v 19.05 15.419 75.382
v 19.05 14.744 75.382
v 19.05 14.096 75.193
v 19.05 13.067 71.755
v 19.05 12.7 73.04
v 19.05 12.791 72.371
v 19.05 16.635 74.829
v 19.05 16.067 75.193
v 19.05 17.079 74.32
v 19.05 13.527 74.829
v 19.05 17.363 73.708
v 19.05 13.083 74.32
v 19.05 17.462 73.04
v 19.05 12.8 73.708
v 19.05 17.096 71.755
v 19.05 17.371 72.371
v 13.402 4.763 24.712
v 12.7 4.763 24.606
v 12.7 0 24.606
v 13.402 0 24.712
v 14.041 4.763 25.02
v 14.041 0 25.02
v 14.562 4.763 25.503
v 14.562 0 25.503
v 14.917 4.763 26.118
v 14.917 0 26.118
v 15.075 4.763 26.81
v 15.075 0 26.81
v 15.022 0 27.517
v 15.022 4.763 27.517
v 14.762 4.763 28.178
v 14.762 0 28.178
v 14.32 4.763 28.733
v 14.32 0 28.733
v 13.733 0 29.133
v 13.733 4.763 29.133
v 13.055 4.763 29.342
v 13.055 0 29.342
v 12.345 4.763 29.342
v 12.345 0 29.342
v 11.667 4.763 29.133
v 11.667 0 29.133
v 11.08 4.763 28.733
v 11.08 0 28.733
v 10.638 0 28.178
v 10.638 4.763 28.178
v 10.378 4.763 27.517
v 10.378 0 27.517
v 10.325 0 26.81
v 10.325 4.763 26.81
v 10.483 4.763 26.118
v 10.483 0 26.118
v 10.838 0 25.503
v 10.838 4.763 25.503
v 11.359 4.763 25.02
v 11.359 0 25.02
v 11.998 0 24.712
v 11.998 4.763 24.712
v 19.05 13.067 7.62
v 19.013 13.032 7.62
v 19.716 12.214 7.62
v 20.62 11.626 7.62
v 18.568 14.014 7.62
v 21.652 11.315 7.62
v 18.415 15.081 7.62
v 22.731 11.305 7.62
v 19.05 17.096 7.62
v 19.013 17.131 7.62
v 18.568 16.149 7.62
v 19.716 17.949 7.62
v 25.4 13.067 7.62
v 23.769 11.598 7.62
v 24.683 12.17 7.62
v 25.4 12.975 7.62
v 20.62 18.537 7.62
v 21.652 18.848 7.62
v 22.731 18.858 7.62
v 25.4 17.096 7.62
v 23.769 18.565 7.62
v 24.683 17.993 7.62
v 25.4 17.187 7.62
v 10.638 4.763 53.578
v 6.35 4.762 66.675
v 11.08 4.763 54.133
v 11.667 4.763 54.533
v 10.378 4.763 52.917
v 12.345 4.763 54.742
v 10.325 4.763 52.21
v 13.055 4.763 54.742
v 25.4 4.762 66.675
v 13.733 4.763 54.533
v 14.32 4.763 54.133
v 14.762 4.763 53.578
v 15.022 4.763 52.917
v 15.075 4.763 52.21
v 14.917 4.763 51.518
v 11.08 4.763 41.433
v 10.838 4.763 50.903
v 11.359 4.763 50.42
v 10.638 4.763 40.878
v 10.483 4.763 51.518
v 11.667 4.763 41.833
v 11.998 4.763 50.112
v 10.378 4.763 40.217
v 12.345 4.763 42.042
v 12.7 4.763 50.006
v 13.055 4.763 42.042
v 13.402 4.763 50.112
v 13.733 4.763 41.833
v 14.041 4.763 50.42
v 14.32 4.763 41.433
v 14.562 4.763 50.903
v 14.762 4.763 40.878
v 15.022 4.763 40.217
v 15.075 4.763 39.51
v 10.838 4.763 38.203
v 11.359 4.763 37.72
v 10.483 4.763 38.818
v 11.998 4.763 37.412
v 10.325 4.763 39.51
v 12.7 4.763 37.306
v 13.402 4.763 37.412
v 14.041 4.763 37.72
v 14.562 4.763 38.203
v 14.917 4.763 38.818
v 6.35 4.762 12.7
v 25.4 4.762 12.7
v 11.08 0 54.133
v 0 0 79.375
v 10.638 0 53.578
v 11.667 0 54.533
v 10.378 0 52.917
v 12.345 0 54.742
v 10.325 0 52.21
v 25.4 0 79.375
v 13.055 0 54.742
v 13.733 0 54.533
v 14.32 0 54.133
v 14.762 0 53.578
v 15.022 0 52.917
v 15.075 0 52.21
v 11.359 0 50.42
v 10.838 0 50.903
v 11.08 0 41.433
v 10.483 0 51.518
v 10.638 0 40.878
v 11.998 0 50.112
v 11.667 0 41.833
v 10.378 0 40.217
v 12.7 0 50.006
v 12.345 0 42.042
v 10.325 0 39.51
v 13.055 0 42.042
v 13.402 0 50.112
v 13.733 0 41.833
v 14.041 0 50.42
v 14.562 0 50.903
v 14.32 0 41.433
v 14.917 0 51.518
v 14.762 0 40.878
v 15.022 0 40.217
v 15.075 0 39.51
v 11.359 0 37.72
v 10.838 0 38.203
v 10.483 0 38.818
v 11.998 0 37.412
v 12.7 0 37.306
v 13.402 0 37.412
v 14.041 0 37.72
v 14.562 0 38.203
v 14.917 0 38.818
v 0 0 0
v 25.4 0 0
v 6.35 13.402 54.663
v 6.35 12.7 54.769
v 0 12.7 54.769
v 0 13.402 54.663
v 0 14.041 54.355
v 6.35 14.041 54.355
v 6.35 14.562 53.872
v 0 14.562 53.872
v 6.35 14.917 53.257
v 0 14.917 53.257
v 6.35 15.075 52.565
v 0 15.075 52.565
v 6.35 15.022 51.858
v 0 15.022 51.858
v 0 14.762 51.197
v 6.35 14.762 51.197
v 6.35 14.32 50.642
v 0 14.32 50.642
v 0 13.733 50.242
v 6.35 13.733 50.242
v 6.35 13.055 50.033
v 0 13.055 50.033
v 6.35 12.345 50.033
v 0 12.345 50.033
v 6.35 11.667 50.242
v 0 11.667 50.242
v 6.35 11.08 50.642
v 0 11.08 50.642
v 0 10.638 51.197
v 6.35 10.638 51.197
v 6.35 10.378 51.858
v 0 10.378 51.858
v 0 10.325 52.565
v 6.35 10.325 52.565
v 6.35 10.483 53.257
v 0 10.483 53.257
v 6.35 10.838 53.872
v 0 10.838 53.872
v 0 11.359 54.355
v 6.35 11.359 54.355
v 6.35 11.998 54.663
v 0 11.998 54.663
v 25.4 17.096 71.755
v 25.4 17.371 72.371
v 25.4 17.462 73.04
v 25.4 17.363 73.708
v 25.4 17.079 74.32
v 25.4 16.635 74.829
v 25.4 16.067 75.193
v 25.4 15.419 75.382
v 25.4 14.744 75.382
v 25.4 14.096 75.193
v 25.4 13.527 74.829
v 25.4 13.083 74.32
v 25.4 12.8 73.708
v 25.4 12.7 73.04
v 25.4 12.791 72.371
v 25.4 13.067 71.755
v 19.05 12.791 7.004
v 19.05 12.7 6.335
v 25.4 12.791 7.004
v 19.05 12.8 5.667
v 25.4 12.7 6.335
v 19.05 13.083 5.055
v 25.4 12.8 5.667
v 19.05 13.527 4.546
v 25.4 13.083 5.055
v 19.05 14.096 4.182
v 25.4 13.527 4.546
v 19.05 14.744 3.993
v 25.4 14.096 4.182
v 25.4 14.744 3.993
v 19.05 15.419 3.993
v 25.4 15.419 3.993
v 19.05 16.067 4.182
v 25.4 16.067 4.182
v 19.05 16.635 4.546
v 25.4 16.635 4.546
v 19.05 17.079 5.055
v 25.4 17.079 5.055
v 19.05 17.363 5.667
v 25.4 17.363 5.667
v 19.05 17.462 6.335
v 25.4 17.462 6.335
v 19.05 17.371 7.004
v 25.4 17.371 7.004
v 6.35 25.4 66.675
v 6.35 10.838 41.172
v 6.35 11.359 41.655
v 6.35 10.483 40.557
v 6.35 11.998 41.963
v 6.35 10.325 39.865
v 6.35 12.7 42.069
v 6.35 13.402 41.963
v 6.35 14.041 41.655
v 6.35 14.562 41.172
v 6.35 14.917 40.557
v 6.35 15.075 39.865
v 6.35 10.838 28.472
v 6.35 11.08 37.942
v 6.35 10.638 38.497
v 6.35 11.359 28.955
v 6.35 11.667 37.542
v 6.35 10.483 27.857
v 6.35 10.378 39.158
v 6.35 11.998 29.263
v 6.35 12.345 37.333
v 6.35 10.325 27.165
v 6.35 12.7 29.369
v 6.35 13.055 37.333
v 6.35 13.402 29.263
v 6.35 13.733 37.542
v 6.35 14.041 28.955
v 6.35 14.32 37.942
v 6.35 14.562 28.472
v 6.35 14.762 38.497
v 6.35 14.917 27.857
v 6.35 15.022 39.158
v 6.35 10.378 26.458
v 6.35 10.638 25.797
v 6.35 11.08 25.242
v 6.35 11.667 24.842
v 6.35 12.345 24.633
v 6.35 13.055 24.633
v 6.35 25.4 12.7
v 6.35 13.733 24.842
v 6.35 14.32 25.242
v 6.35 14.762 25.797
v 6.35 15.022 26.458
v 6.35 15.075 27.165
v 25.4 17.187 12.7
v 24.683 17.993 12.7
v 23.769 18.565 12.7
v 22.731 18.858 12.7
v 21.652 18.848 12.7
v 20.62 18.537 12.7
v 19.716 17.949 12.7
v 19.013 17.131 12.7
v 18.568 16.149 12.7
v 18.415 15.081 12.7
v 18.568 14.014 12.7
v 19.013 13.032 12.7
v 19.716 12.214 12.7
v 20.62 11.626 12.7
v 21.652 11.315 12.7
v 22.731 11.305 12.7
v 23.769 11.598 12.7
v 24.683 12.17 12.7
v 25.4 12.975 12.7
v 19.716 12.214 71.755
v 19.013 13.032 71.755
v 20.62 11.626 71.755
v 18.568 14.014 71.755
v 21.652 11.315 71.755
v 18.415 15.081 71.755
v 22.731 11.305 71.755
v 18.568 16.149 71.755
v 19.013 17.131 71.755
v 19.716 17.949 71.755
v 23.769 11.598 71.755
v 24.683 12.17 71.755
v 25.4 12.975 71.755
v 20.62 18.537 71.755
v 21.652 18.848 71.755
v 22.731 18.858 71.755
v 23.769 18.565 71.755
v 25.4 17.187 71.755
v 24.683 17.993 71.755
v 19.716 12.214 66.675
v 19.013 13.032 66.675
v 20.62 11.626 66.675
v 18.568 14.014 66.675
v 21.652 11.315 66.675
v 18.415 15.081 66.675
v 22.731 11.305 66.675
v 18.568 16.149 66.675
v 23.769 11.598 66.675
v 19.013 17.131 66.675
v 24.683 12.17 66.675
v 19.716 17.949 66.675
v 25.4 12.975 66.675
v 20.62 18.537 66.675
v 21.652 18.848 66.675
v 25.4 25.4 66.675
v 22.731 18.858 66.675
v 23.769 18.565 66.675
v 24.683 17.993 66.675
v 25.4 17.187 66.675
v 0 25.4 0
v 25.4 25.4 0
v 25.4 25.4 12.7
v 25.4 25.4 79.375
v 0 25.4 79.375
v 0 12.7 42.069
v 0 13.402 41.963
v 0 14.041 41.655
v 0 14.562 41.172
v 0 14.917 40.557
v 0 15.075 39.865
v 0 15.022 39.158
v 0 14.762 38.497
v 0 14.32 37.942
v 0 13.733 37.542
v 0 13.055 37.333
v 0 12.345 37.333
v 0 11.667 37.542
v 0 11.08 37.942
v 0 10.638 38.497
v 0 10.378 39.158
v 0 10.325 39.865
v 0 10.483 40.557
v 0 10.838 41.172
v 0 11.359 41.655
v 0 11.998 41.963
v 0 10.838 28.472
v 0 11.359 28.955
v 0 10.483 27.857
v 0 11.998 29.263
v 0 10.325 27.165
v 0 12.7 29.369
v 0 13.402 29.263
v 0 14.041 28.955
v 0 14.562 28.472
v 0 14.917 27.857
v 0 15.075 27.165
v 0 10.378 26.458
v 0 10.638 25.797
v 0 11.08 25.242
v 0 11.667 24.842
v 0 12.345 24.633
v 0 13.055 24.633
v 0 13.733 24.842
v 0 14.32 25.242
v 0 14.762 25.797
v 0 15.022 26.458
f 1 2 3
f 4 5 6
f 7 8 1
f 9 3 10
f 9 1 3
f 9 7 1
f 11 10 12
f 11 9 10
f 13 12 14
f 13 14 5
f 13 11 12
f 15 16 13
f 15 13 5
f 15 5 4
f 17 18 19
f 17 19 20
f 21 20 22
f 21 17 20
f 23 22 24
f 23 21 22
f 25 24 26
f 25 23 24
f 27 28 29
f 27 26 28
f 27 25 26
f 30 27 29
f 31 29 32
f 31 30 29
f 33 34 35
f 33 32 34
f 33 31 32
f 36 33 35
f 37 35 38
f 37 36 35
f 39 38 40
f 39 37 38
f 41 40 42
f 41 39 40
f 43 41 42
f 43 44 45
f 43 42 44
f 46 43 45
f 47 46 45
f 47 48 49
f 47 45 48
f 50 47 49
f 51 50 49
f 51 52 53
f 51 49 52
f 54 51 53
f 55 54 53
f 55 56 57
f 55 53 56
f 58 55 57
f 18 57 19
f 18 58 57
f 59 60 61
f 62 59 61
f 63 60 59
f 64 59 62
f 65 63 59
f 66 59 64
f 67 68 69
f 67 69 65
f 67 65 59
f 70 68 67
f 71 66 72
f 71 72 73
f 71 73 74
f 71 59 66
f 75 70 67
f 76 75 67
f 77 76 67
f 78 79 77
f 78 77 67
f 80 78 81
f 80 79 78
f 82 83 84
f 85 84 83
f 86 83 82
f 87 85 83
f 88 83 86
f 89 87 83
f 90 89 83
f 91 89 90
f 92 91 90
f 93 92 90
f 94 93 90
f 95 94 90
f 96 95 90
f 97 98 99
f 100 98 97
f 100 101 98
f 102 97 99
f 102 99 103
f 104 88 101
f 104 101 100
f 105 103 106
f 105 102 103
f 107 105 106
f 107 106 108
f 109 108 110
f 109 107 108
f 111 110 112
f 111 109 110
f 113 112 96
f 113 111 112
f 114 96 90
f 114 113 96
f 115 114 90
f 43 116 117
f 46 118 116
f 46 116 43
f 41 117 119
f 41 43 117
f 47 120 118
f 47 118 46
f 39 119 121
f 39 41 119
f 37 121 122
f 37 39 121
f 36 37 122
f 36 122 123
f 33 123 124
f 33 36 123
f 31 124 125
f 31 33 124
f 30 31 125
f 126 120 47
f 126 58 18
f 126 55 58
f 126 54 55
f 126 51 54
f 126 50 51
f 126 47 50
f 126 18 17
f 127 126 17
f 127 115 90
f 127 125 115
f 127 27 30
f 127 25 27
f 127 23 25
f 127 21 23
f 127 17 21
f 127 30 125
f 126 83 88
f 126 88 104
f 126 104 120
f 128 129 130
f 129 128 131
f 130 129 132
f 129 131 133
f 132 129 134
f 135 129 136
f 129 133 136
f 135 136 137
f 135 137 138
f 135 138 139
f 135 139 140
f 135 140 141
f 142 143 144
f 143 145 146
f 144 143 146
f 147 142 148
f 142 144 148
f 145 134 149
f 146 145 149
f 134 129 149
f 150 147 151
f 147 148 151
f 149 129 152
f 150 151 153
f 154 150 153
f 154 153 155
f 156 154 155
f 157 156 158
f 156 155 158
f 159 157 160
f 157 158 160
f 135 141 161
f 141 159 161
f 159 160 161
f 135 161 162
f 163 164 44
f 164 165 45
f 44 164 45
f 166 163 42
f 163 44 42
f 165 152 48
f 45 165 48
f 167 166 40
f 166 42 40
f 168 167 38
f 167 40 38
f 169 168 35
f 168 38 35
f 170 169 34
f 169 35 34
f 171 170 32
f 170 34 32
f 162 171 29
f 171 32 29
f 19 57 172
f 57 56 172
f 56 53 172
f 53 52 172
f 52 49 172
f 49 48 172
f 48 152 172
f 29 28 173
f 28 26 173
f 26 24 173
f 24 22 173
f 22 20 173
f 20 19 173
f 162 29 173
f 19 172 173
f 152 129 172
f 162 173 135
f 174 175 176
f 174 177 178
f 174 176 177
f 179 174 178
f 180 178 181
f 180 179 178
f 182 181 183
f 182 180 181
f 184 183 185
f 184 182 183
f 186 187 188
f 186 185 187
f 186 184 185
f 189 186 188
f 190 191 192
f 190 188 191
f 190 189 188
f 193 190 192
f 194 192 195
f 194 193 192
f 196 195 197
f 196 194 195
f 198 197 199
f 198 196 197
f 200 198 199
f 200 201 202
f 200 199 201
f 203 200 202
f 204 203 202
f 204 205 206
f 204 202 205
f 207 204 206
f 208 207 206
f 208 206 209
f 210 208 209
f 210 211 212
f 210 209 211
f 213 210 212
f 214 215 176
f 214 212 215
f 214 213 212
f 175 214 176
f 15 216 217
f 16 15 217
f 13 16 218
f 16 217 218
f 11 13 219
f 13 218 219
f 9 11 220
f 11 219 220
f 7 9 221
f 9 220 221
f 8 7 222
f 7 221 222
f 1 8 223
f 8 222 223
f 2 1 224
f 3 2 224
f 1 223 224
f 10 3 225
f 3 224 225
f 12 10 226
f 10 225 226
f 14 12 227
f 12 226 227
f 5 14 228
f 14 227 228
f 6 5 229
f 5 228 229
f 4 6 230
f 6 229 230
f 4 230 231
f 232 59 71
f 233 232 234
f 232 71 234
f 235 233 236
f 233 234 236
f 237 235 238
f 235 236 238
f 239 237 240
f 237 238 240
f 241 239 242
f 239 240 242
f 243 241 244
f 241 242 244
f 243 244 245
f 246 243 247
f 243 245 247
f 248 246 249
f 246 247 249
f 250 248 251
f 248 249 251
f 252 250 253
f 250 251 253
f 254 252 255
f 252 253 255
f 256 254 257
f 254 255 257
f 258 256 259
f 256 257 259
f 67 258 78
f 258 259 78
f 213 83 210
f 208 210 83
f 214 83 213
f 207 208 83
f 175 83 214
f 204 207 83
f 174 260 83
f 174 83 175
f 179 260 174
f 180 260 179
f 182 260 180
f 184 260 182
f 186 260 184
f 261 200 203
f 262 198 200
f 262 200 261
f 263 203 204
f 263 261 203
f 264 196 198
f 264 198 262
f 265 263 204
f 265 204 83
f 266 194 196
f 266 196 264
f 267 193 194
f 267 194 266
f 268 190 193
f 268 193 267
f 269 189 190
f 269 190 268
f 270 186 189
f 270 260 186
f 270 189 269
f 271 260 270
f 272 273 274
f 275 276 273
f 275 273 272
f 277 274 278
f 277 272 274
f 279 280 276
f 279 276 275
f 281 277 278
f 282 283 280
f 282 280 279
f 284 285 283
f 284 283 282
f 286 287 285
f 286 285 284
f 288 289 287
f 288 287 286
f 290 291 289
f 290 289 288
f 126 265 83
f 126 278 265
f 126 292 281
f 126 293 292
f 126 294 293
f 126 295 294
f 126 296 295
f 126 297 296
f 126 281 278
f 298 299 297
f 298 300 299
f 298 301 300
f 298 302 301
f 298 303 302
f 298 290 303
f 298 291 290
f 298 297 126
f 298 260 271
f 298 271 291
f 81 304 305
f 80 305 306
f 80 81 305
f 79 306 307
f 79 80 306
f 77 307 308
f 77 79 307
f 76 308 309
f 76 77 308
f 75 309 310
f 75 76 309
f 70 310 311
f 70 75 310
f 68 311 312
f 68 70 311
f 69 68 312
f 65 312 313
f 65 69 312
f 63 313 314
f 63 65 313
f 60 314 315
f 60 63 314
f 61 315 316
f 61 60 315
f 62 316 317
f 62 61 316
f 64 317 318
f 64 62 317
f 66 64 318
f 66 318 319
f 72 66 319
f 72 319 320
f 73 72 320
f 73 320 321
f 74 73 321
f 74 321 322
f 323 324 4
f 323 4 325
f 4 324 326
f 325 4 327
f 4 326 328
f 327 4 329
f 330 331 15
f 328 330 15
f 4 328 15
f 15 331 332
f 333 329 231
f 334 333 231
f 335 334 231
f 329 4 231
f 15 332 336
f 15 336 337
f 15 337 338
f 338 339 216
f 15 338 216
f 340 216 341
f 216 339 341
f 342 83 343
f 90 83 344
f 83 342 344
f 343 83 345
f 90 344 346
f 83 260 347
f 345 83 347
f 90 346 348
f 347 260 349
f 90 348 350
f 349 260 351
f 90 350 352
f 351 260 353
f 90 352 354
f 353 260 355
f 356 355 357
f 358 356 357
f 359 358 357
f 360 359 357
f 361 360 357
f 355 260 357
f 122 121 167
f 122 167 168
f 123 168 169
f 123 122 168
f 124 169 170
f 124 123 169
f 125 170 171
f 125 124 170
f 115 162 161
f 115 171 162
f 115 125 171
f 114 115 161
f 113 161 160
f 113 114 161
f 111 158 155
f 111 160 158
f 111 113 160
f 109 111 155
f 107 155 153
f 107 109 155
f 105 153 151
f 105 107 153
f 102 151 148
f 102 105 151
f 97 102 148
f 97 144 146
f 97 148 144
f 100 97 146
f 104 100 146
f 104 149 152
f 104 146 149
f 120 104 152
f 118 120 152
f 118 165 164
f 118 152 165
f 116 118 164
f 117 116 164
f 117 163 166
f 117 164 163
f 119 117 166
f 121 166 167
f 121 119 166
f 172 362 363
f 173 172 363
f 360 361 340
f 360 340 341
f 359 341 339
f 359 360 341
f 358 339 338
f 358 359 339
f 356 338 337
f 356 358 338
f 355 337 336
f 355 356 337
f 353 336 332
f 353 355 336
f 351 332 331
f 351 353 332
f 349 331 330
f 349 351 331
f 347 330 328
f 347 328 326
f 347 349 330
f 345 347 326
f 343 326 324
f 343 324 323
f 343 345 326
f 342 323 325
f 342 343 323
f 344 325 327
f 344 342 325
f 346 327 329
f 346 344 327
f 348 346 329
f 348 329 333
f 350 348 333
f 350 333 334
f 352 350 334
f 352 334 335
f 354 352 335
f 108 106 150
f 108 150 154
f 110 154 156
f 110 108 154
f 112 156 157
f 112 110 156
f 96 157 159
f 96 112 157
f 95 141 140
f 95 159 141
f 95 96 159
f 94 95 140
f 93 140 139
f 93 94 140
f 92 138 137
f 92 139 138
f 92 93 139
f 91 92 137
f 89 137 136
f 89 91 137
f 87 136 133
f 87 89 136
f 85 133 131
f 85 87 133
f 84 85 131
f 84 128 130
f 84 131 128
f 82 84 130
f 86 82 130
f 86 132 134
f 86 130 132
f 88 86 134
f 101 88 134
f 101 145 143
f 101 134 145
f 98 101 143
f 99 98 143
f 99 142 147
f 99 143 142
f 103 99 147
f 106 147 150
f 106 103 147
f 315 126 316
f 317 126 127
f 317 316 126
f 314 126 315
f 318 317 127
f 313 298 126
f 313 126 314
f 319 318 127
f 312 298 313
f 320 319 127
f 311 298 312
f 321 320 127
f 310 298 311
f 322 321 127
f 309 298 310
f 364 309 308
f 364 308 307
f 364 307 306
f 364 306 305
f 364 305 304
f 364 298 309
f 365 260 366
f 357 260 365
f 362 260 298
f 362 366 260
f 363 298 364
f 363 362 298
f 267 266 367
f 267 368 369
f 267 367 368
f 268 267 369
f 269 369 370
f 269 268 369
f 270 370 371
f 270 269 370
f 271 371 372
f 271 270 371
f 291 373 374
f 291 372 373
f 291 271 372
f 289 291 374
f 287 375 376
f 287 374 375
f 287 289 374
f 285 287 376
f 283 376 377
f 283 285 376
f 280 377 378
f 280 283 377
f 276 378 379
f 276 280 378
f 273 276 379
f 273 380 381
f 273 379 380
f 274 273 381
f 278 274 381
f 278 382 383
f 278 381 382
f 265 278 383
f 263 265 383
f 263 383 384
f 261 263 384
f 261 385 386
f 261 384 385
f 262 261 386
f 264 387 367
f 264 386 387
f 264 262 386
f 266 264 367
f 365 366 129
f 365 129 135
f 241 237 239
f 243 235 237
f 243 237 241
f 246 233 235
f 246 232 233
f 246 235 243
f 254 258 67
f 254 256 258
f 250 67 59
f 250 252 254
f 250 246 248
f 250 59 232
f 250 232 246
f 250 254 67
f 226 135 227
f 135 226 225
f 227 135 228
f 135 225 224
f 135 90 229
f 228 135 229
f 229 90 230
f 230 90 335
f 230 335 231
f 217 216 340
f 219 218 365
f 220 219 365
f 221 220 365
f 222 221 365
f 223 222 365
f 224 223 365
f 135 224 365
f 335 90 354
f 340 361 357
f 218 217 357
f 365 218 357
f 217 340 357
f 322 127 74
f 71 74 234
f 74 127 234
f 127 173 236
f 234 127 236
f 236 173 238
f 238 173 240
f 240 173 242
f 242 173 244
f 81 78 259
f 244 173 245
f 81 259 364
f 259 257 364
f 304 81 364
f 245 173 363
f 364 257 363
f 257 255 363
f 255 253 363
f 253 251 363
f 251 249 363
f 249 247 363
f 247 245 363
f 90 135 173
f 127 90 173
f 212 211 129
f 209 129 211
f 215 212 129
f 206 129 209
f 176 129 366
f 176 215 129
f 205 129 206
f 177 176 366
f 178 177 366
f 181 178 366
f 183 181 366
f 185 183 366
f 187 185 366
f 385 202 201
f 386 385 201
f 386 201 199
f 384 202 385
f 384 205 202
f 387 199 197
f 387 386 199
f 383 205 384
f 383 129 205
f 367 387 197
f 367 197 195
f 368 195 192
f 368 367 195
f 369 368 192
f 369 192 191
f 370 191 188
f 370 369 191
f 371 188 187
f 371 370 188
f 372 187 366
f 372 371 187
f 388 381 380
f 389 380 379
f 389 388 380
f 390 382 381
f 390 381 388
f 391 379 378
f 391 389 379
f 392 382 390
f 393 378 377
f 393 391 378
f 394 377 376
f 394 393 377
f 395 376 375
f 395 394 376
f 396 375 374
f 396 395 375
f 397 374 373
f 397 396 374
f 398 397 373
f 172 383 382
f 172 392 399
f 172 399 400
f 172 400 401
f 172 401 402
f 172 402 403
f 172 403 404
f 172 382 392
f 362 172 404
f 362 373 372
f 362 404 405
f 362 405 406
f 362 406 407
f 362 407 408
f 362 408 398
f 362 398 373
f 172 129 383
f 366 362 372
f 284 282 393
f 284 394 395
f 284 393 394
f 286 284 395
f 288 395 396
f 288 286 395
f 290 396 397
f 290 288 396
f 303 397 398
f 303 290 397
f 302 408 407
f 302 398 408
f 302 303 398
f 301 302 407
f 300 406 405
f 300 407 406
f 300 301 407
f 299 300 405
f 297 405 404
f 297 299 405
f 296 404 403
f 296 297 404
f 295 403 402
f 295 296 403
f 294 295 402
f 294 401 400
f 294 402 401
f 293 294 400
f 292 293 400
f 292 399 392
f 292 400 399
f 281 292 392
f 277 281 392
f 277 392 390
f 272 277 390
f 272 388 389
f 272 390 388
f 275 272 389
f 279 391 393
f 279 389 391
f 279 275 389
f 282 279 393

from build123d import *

# Parameters (mm, degrees)
SKETCH1_W               = 25.4
SKETCH1_H               = 25.4
BOSS_EXTRUDE1_DEPTH     = 79.375
SKETCH2_W               = 19.05
SKETCH2_H               = 53.975
CUT_EXTRUDE1_DEPTH      = 20.6375
CUT_EXTRUDE2_DEPTH      = 88.124684361
CUT_EXTRUDE2_DEPTH_BACK = 88.124684361
SKETCH3_R               = 2.38125
CUT_EXTRUDE3_DEPTH      = 88.124684361
CUT_EXTRUDE3_DEPTH_BACK = 88.124684361
SKETCH4_R               = 2.38125
CUT_EXTRUDE4_DEPTH      = 59.055
CUT_EXTRUDE4_DEPTH_BACK = 5.08
SKETCH6_R               = 3.81
SKETCH8_R               = 2.38125
CUT_EXTRUDE5_DEPTH      = 6.35


with BuildPart() as part:
    # Sketch1 → Boss-Extrude1 (new body)
    with BuildSketch(Plane.XY):
        with Locations((12.7, 12.7)):
            Rectangle(SKETCH1_W, SKETCH1_H)
    extrude(amount=BOSS_EXTRUDE1_DEPTH)

    # Sketch2 → Cut-Extrude1 (cut)
    with BuildSketch(Plane(origin=(0, 25.4, 0), x_dir=(1, 0, 0), z_dir=(0, 1, 0))):
        with Locations((15.875, -39.6875)):
            Rectangle(SKETCH2_W, SKETCH2_H)
    extrude(amount=-CUT_EXTRUDE1_DEPTH, mode=Mode.SUBTRACT)

    # Sketch3 → Cut-Extrude2 (cut, two sides: drawn at the far end of the back side and taken through both)
    with BuildSketch(Plane.ZY.offset(-CUT_EXTRUDE2_DEPTH_BACK)):
        with Locations((26.9875, 12.7)):
            Circle(SKETCH3_R)
        with Locations((39.6875, 12.7)):
            Circle(SKETCH3_R)
        with Locations((52.3875, 12.7)):
            Circle(SKETCH3_R)
    extrude(amount=CUT_EXTRUDE2_DEPTH + CUT_EXTRUDE2_DEPTH_BACK, mode=Mode.SUBTRACT)

    # Sketch4 → Cut-Extrude3 (cut, two sides: drawn at the far end of the back side and taken through both)
    with BuildSketch(Plane.XZ.offset(-CUT_EXTRUDE3_DEPTH_BACK)):
        with Locations(Location((12.7, 52.3875, 0), (0, 0, 270))):
            Circle(SKETCH4_R)
        with Locations(Location((12.7, 39.6875, 0), (0, 0, 270))):
            Circle(SKETCH4_R)
        with Locations(Location((12.7, 26.9875, 0), (0, 0, 270))):
            Circle(SKETCH4_R)
    extrude(amount=CUT_EXTRUDE3_DEPTH + CUT_EXTRUDE3_DEPTH_BACK, mode=Mode.SUBTRACT)

    # Sketch6 → Cut-Extrude4 (cut, two sides: drawn at the far end of the back side and taken through both)
    with BuildSketch(Plane.XY.offset(12.7).offset(-CUT_EXTRUDE4_DEPTH_BACK)):
        with Locations((22.225, 15.08125)):
            Circle(SKETCH6_R)
    extrude(amount=CUT_EXTRUDE4_DEPTH + CUT_EXTRUDE4_DEPTH_BACK, mode=Mode.SUBTRACT)

    # Sketch8 → Cut-Extrude5 (cut)
    with BuildSketch(Plane(origin=(25.4, 0, 0), x_dir=(0, 0, -1), z_dir=(1, 0, 0))):
        with Locations((-73.025, 15.08125)):
            Circle(SKETCH8_R)
        with Locations((-6.35, 15.08125)):
            Circle(SKETCH8_R)
    extrude(amount=-CUT_EXTRUDE5_DEPTH, mode=Mode.SUBTRACT)


solid = part.part
